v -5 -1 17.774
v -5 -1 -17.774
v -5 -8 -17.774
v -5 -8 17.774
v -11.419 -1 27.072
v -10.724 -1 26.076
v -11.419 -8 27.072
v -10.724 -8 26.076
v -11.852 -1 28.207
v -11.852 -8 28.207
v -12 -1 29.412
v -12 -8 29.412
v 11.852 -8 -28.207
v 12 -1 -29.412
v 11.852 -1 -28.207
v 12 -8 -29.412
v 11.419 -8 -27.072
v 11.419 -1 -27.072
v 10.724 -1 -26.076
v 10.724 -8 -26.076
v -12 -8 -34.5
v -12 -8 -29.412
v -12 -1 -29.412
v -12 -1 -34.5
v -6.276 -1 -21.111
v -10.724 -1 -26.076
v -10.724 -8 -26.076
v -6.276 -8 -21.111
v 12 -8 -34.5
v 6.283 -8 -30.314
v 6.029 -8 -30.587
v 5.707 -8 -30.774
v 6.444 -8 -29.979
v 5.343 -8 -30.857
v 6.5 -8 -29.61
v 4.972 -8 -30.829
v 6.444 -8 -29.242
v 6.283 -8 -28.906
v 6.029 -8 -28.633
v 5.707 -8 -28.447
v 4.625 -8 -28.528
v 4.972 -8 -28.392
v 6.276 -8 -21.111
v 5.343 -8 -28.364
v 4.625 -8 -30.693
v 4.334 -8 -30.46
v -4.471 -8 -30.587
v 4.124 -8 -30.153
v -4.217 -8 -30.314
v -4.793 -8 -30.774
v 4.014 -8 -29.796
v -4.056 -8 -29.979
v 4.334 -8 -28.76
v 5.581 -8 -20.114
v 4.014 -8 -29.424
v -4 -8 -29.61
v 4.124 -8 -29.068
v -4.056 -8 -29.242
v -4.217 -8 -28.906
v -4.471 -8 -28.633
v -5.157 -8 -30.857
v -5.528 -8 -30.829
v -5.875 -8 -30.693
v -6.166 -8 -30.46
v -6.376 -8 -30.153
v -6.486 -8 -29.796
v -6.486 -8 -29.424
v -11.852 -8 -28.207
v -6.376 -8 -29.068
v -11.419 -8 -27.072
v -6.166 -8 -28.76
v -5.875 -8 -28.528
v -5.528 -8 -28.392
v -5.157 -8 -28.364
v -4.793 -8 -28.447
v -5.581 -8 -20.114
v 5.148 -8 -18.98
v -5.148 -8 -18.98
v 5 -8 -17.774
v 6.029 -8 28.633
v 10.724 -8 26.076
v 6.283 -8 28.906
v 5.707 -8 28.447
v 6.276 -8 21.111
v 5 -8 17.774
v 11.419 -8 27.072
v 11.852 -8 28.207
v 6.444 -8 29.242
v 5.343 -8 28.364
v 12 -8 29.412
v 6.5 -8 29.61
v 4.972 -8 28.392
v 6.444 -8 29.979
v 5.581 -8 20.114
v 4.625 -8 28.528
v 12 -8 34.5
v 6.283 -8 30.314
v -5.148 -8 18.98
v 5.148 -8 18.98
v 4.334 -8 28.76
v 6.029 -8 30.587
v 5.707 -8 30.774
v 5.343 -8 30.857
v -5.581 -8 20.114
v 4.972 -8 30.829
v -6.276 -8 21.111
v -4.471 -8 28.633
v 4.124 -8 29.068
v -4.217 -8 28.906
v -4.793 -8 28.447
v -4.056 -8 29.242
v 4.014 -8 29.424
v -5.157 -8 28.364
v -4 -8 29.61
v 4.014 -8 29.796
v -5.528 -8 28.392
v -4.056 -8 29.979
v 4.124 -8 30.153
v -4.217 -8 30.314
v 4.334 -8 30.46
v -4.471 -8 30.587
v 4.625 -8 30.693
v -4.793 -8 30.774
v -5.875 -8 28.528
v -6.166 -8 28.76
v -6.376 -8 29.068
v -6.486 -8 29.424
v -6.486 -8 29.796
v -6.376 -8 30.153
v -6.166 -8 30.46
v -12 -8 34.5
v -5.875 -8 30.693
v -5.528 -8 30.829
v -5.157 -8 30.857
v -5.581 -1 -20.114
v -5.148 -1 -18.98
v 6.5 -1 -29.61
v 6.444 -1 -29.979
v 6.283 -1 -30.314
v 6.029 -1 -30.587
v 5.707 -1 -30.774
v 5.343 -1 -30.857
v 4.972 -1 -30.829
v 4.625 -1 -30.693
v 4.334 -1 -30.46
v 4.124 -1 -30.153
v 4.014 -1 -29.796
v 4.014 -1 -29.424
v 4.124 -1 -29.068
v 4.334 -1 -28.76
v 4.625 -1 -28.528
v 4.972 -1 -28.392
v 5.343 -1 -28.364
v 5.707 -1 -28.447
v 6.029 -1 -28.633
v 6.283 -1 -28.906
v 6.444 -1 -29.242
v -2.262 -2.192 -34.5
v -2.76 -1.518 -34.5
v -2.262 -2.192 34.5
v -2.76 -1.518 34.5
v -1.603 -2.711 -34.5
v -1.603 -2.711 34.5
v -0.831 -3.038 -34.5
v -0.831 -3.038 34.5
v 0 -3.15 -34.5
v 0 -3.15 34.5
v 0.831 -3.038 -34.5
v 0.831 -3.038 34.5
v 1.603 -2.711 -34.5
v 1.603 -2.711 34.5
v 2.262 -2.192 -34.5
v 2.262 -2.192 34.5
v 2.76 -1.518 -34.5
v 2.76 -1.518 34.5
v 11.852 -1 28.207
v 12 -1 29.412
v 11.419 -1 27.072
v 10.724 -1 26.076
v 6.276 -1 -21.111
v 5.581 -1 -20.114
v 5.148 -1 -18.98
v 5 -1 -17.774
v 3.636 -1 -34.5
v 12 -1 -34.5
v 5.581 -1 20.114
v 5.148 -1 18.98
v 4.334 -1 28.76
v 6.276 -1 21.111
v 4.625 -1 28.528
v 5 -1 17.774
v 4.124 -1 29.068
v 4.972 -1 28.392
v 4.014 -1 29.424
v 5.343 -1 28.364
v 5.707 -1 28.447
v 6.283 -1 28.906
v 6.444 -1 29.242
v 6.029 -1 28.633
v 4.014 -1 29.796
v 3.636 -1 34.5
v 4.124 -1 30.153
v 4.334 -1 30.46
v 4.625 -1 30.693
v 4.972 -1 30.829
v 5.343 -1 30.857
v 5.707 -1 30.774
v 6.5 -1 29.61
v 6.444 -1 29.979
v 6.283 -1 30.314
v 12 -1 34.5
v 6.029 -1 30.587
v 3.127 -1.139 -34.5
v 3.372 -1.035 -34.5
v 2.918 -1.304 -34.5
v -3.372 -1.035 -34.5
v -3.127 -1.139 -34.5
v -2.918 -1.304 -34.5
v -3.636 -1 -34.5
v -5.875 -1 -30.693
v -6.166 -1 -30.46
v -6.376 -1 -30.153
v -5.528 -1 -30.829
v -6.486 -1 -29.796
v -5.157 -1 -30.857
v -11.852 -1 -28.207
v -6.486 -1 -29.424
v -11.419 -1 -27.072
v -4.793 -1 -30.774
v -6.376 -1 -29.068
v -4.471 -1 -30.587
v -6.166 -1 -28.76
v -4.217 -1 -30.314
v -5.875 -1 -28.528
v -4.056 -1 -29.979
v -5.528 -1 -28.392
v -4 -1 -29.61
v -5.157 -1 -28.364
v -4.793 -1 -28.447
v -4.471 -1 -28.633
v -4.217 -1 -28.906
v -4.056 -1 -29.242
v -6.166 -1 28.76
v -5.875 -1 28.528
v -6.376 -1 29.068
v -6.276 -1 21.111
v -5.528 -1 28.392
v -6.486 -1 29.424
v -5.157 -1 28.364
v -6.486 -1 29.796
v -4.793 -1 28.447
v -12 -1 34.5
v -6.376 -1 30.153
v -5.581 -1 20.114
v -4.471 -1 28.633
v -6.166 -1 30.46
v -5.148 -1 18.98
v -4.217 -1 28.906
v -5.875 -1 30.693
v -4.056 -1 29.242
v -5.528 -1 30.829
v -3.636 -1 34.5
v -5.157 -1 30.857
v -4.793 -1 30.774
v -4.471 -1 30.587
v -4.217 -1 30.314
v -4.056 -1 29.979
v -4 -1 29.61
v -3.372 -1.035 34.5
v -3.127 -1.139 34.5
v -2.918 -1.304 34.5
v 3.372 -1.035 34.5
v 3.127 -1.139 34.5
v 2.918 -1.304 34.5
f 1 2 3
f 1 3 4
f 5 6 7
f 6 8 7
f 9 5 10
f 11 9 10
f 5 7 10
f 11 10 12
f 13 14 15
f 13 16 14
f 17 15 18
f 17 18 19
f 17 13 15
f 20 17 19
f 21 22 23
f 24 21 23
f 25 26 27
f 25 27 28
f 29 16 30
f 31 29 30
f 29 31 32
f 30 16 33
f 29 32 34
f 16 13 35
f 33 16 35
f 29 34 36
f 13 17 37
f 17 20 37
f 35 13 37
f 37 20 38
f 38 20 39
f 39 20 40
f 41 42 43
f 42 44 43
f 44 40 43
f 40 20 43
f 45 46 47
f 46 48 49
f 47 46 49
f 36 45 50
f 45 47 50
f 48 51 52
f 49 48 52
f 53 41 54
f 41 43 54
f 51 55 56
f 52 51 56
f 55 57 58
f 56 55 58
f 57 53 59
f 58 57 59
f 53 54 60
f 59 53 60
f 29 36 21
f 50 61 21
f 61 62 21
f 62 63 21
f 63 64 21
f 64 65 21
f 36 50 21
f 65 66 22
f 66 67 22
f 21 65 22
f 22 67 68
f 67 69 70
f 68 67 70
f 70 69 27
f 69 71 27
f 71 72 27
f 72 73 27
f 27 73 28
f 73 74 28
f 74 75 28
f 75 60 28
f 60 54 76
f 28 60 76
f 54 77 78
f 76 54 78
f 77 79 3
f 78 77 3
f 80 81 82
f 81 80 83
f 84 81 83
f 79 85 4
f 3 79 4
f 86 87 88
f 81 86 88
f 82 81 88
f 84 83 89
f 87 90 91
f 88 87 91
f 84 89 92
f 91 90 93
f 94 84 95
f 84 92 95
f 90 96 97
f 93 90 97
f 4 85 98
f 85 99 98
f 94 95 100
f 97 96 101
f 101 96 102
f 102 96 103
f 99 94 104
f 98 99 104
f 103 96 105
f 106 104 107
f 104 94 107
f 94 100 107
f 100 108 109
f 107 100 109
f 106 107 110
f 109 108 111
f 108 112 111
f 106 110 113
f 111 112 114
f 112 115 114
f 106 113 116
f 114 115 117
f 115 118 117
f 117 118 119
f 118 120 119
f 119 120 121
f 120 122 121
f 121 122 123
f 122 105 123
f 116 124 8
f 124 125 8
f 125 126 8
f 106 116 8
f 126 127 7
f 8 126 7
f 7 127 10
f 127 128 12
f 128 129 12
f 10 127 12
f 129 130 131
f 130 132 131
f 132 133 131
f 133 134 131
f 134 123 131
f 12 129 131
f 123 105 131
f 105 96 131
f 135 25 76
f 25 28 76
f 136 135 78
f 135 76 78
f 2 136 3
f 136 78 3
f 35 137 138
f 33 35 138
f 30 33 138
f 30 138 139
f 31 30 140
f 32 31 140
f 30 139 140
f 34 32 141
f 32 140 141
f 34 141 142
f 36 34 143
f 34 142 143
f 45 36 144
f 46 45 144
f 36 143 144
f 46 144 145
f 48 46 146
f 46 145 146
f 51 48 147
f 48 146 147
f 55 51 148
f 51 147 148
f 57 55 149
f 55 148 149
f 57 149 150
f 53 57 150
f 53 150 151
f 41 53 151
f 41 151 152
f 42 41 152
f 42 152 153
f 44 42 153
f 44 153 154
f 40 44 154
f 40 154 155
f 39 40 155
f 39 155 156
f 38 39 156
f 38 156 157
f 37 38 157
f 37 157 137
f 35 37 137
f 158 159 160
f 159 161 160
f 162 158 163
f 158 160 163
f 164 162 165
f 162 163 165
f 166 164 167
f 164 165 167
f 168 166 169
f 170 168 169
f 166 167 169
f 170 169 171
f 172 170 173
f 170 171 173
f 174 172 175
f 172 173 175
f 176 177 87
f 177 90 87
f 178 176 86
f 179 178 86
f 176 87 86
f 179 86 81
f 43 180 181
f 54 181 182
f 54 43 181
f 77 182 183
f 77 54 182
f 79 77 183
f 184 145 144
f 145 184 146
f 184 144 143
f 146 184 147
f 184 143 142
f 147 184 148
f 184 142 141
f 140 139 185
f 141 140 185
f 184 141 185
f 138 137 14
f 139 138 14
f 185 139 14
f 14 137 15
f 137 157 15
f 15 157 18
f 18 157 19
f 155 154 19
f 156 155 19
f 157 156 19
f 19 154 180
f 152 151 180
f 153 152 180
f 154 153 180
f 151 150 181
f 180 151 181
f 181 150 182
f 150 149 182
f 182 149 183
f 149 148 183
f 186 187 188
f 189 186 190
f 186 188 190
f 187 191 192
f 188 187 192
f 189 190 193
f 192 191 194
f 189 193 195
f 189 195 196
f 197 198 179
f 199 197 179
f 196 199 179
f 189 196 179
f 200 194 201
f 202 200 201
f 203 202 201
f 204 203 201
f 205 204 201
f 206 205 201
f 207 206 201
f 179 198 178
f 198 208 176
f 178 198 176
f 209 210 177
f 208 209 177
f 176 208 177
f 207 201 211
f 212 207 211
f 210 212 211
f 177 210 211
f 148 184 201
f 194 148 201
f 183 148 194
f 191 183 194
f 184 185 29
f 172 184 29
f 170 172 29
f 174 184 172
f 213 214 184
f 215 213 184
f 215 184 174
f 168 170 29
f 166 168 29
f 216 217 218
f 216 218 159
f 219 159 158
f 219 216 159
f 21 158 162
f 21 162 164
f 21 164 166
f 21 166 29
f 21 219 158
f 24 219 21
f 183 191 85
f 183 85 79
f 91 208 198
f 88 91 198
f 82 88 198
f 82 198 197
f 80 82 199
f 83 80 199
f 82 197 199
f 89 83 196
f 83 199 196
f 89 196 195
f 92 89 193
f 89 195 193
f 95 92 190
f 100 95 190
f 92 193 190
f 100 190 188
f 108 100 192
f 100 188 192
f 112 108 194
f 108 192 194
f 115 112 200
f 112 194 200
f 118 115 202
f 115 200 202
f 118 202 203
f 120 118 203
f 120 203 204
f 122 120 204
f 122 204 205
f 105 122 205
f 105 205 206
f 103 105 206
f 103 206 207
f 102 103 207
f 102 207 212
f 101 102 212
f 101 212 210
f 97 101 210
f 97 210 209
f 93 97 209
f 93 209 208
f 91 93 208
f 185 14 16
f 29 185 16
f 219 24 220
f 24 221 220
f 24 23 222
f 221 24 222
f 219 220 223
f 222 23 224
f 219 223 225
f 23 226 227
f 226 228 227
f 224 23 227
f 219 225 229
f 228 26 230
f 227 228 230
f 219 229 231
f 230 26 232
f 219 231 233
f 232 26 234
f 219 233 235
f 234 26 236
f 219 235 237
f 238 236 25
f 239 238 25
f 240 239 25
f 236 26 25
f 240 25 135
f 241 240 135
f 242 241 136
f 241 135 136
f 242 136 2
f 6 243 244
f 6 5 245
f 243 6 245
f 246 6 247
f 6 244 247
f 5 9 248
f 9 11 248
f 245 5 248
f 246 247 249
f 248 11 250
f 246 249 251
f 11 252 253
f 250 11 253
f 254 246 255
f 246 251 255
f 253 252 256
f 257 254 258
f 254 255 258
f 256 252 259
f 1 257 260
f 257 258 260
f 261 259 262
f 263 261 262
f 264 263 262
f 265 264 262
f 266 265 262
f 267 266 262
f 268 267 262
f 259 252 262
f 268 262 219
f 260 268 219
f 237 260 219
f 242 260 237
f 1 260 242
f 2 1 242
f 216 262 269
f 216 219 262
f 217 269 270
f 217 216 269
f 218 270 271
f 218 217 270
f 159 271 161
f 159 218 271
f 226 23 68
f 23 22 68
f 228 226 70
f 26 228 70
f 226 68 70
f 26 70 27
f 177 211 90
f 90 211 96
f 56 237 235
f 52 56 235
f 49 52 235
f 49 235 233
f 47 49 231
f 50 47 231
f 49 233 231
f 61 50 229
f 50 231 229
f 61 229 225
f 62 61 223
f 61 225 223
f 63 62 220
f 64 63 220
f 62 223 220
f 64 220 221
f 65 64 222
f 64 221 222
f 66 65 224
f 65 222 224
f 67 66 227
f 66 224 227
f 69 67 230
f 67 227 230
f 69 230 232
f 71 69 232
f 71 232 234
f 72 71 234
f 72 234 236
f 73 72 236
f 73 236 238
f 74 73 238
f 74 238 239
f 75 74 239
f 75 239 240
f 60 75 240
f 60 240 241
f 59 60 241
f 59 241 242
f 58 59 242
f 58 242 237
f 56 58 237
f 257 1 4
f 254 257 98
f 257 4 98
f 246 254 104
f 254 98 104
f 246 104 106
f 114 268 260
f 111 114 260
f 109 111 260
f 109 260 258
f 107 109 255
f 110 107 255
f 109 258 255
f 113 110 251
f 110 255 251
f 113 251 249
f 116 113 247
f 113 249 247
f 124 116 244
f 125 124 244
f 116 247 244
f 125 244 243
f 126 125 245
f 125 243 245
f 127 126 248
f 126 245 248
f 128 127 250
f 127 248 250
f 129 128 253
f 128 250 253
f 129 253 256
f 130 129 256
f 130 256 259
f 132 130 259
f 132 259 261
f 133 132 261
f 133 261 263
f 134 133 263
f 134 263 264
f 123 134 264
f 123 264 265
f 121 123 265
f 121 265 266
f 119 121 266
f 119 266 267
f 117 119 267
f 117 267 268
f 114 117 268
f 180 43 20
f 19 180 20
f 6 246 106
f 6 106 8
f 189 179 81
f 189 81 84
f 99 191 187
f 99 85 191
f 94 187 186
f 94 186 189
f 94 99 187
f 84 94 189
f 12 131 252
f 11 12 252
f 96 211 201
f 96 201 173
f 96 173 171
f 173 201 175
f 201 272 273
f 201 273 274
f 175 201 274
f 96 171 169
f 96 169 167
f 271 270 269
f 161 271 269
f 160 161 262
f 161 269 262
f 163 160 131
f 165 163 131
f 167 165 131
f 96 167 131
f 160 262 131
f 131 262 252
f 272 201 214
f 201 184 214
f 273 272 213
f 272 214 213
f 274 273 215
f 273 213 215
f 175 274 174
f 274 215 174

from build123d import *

# Parameters (mm, degrees)
BOSS_EXTRUDE1_DEPTH = 34.5
FILLET1_R           = 1
CUT_EXTRUDE1_DEPTH  = 8
FILLET2_R           = 5
SKETCH3_R           = 1.25
CUT_EXTRUDE2_DEPTH  = 8


with BuildPart() as part:
    # Sketch1 → Boss-Extrude1 (new body, symmetric)
    with BuildSketch(Plane.XY):
        with BuildLine():
            Line((-12, -1), (-2.987055406, -1))
            ThreePointArc((-2.987055406, -1), (0, -3.15), (2.987055406, -1))
            Line((2.987055406, -1), (12, -1))
            Line((12, -1), (12, -8))
            Line((12, -8), (-12, -8))
            Line((-12, -8), (-12, -1))
        make_face()
    extrude(amount=BOSS_EXTRUDE1_DEPTH, both=True)

    # Fillet1
    fillet1_edges = [part.edges().sort_by_distance(p)[0] for p in [
        (-2.987055406, -1, 0),
        (2.987055406, -1, 0),
    ]]
    fillet(fillet1_edges, radius=FILLET1_R)

    # Sketch2 → Cut-Extrude1 (cut, through all)
    with BuildSketch(Plane(origin=(0, -1, 0), x_dir=(1, 0, 0), z_dir=(0, 1, 0))):
        Polygon((-12, 27.5), (-5, 19.686646885), (-5, -19.686646885), (-12, -27.5), align=None)
        Polygon((12, -27.5), (5, -19.686646885), (5, 19.686646885), (12, 27.5), align=None)
    extrude(amount=-CUT_EXTRUDE1_DEPTH, mode=Mode.SUBTRACT)

    # Fillet2
    fillet2_edges = [part.edges().sort_by_distance(p)[0] for p in [
        (-12, -4.5, 27.5),
        (-12, -4.5, -27.5),
        (-5, -4.5, -19.686646885),
        (-5, -4.5, 19.686646885),
        (12, -4.5, -27.5),
        (12, -4.5, 27.5),
        (5, -4.5, 19.686646885),
        (5, -4.5, -19.686646885),
    ]]
    fillet(fillet2_edges, radius=FILLET2_R)

    # Sketch3 → Cut-Extrude2 (cut, through all)
    with BuildSketch(Plane(origin=(0, -1, 0), x_dir=(1, 0, 0), z_dir=(0, 1, 0))):
        with Locations((5.25, 29.610191819)):
            Circle(SKETCH3_R)
        with Locations((-5.25, 29.610191819)):
            Circle(SKETCH3_R)
        with Locations((-5.25, -29.610191819)):
            Circle(SKETCH3_R)
        with Locations((5.25, -29.610191819)):
            Circle(SKETCH3_R)
    extrude(amount=-CUT_EXTRUDE2_DEPTH, mode=Mode.SUBTRACT)


solid = part.part
